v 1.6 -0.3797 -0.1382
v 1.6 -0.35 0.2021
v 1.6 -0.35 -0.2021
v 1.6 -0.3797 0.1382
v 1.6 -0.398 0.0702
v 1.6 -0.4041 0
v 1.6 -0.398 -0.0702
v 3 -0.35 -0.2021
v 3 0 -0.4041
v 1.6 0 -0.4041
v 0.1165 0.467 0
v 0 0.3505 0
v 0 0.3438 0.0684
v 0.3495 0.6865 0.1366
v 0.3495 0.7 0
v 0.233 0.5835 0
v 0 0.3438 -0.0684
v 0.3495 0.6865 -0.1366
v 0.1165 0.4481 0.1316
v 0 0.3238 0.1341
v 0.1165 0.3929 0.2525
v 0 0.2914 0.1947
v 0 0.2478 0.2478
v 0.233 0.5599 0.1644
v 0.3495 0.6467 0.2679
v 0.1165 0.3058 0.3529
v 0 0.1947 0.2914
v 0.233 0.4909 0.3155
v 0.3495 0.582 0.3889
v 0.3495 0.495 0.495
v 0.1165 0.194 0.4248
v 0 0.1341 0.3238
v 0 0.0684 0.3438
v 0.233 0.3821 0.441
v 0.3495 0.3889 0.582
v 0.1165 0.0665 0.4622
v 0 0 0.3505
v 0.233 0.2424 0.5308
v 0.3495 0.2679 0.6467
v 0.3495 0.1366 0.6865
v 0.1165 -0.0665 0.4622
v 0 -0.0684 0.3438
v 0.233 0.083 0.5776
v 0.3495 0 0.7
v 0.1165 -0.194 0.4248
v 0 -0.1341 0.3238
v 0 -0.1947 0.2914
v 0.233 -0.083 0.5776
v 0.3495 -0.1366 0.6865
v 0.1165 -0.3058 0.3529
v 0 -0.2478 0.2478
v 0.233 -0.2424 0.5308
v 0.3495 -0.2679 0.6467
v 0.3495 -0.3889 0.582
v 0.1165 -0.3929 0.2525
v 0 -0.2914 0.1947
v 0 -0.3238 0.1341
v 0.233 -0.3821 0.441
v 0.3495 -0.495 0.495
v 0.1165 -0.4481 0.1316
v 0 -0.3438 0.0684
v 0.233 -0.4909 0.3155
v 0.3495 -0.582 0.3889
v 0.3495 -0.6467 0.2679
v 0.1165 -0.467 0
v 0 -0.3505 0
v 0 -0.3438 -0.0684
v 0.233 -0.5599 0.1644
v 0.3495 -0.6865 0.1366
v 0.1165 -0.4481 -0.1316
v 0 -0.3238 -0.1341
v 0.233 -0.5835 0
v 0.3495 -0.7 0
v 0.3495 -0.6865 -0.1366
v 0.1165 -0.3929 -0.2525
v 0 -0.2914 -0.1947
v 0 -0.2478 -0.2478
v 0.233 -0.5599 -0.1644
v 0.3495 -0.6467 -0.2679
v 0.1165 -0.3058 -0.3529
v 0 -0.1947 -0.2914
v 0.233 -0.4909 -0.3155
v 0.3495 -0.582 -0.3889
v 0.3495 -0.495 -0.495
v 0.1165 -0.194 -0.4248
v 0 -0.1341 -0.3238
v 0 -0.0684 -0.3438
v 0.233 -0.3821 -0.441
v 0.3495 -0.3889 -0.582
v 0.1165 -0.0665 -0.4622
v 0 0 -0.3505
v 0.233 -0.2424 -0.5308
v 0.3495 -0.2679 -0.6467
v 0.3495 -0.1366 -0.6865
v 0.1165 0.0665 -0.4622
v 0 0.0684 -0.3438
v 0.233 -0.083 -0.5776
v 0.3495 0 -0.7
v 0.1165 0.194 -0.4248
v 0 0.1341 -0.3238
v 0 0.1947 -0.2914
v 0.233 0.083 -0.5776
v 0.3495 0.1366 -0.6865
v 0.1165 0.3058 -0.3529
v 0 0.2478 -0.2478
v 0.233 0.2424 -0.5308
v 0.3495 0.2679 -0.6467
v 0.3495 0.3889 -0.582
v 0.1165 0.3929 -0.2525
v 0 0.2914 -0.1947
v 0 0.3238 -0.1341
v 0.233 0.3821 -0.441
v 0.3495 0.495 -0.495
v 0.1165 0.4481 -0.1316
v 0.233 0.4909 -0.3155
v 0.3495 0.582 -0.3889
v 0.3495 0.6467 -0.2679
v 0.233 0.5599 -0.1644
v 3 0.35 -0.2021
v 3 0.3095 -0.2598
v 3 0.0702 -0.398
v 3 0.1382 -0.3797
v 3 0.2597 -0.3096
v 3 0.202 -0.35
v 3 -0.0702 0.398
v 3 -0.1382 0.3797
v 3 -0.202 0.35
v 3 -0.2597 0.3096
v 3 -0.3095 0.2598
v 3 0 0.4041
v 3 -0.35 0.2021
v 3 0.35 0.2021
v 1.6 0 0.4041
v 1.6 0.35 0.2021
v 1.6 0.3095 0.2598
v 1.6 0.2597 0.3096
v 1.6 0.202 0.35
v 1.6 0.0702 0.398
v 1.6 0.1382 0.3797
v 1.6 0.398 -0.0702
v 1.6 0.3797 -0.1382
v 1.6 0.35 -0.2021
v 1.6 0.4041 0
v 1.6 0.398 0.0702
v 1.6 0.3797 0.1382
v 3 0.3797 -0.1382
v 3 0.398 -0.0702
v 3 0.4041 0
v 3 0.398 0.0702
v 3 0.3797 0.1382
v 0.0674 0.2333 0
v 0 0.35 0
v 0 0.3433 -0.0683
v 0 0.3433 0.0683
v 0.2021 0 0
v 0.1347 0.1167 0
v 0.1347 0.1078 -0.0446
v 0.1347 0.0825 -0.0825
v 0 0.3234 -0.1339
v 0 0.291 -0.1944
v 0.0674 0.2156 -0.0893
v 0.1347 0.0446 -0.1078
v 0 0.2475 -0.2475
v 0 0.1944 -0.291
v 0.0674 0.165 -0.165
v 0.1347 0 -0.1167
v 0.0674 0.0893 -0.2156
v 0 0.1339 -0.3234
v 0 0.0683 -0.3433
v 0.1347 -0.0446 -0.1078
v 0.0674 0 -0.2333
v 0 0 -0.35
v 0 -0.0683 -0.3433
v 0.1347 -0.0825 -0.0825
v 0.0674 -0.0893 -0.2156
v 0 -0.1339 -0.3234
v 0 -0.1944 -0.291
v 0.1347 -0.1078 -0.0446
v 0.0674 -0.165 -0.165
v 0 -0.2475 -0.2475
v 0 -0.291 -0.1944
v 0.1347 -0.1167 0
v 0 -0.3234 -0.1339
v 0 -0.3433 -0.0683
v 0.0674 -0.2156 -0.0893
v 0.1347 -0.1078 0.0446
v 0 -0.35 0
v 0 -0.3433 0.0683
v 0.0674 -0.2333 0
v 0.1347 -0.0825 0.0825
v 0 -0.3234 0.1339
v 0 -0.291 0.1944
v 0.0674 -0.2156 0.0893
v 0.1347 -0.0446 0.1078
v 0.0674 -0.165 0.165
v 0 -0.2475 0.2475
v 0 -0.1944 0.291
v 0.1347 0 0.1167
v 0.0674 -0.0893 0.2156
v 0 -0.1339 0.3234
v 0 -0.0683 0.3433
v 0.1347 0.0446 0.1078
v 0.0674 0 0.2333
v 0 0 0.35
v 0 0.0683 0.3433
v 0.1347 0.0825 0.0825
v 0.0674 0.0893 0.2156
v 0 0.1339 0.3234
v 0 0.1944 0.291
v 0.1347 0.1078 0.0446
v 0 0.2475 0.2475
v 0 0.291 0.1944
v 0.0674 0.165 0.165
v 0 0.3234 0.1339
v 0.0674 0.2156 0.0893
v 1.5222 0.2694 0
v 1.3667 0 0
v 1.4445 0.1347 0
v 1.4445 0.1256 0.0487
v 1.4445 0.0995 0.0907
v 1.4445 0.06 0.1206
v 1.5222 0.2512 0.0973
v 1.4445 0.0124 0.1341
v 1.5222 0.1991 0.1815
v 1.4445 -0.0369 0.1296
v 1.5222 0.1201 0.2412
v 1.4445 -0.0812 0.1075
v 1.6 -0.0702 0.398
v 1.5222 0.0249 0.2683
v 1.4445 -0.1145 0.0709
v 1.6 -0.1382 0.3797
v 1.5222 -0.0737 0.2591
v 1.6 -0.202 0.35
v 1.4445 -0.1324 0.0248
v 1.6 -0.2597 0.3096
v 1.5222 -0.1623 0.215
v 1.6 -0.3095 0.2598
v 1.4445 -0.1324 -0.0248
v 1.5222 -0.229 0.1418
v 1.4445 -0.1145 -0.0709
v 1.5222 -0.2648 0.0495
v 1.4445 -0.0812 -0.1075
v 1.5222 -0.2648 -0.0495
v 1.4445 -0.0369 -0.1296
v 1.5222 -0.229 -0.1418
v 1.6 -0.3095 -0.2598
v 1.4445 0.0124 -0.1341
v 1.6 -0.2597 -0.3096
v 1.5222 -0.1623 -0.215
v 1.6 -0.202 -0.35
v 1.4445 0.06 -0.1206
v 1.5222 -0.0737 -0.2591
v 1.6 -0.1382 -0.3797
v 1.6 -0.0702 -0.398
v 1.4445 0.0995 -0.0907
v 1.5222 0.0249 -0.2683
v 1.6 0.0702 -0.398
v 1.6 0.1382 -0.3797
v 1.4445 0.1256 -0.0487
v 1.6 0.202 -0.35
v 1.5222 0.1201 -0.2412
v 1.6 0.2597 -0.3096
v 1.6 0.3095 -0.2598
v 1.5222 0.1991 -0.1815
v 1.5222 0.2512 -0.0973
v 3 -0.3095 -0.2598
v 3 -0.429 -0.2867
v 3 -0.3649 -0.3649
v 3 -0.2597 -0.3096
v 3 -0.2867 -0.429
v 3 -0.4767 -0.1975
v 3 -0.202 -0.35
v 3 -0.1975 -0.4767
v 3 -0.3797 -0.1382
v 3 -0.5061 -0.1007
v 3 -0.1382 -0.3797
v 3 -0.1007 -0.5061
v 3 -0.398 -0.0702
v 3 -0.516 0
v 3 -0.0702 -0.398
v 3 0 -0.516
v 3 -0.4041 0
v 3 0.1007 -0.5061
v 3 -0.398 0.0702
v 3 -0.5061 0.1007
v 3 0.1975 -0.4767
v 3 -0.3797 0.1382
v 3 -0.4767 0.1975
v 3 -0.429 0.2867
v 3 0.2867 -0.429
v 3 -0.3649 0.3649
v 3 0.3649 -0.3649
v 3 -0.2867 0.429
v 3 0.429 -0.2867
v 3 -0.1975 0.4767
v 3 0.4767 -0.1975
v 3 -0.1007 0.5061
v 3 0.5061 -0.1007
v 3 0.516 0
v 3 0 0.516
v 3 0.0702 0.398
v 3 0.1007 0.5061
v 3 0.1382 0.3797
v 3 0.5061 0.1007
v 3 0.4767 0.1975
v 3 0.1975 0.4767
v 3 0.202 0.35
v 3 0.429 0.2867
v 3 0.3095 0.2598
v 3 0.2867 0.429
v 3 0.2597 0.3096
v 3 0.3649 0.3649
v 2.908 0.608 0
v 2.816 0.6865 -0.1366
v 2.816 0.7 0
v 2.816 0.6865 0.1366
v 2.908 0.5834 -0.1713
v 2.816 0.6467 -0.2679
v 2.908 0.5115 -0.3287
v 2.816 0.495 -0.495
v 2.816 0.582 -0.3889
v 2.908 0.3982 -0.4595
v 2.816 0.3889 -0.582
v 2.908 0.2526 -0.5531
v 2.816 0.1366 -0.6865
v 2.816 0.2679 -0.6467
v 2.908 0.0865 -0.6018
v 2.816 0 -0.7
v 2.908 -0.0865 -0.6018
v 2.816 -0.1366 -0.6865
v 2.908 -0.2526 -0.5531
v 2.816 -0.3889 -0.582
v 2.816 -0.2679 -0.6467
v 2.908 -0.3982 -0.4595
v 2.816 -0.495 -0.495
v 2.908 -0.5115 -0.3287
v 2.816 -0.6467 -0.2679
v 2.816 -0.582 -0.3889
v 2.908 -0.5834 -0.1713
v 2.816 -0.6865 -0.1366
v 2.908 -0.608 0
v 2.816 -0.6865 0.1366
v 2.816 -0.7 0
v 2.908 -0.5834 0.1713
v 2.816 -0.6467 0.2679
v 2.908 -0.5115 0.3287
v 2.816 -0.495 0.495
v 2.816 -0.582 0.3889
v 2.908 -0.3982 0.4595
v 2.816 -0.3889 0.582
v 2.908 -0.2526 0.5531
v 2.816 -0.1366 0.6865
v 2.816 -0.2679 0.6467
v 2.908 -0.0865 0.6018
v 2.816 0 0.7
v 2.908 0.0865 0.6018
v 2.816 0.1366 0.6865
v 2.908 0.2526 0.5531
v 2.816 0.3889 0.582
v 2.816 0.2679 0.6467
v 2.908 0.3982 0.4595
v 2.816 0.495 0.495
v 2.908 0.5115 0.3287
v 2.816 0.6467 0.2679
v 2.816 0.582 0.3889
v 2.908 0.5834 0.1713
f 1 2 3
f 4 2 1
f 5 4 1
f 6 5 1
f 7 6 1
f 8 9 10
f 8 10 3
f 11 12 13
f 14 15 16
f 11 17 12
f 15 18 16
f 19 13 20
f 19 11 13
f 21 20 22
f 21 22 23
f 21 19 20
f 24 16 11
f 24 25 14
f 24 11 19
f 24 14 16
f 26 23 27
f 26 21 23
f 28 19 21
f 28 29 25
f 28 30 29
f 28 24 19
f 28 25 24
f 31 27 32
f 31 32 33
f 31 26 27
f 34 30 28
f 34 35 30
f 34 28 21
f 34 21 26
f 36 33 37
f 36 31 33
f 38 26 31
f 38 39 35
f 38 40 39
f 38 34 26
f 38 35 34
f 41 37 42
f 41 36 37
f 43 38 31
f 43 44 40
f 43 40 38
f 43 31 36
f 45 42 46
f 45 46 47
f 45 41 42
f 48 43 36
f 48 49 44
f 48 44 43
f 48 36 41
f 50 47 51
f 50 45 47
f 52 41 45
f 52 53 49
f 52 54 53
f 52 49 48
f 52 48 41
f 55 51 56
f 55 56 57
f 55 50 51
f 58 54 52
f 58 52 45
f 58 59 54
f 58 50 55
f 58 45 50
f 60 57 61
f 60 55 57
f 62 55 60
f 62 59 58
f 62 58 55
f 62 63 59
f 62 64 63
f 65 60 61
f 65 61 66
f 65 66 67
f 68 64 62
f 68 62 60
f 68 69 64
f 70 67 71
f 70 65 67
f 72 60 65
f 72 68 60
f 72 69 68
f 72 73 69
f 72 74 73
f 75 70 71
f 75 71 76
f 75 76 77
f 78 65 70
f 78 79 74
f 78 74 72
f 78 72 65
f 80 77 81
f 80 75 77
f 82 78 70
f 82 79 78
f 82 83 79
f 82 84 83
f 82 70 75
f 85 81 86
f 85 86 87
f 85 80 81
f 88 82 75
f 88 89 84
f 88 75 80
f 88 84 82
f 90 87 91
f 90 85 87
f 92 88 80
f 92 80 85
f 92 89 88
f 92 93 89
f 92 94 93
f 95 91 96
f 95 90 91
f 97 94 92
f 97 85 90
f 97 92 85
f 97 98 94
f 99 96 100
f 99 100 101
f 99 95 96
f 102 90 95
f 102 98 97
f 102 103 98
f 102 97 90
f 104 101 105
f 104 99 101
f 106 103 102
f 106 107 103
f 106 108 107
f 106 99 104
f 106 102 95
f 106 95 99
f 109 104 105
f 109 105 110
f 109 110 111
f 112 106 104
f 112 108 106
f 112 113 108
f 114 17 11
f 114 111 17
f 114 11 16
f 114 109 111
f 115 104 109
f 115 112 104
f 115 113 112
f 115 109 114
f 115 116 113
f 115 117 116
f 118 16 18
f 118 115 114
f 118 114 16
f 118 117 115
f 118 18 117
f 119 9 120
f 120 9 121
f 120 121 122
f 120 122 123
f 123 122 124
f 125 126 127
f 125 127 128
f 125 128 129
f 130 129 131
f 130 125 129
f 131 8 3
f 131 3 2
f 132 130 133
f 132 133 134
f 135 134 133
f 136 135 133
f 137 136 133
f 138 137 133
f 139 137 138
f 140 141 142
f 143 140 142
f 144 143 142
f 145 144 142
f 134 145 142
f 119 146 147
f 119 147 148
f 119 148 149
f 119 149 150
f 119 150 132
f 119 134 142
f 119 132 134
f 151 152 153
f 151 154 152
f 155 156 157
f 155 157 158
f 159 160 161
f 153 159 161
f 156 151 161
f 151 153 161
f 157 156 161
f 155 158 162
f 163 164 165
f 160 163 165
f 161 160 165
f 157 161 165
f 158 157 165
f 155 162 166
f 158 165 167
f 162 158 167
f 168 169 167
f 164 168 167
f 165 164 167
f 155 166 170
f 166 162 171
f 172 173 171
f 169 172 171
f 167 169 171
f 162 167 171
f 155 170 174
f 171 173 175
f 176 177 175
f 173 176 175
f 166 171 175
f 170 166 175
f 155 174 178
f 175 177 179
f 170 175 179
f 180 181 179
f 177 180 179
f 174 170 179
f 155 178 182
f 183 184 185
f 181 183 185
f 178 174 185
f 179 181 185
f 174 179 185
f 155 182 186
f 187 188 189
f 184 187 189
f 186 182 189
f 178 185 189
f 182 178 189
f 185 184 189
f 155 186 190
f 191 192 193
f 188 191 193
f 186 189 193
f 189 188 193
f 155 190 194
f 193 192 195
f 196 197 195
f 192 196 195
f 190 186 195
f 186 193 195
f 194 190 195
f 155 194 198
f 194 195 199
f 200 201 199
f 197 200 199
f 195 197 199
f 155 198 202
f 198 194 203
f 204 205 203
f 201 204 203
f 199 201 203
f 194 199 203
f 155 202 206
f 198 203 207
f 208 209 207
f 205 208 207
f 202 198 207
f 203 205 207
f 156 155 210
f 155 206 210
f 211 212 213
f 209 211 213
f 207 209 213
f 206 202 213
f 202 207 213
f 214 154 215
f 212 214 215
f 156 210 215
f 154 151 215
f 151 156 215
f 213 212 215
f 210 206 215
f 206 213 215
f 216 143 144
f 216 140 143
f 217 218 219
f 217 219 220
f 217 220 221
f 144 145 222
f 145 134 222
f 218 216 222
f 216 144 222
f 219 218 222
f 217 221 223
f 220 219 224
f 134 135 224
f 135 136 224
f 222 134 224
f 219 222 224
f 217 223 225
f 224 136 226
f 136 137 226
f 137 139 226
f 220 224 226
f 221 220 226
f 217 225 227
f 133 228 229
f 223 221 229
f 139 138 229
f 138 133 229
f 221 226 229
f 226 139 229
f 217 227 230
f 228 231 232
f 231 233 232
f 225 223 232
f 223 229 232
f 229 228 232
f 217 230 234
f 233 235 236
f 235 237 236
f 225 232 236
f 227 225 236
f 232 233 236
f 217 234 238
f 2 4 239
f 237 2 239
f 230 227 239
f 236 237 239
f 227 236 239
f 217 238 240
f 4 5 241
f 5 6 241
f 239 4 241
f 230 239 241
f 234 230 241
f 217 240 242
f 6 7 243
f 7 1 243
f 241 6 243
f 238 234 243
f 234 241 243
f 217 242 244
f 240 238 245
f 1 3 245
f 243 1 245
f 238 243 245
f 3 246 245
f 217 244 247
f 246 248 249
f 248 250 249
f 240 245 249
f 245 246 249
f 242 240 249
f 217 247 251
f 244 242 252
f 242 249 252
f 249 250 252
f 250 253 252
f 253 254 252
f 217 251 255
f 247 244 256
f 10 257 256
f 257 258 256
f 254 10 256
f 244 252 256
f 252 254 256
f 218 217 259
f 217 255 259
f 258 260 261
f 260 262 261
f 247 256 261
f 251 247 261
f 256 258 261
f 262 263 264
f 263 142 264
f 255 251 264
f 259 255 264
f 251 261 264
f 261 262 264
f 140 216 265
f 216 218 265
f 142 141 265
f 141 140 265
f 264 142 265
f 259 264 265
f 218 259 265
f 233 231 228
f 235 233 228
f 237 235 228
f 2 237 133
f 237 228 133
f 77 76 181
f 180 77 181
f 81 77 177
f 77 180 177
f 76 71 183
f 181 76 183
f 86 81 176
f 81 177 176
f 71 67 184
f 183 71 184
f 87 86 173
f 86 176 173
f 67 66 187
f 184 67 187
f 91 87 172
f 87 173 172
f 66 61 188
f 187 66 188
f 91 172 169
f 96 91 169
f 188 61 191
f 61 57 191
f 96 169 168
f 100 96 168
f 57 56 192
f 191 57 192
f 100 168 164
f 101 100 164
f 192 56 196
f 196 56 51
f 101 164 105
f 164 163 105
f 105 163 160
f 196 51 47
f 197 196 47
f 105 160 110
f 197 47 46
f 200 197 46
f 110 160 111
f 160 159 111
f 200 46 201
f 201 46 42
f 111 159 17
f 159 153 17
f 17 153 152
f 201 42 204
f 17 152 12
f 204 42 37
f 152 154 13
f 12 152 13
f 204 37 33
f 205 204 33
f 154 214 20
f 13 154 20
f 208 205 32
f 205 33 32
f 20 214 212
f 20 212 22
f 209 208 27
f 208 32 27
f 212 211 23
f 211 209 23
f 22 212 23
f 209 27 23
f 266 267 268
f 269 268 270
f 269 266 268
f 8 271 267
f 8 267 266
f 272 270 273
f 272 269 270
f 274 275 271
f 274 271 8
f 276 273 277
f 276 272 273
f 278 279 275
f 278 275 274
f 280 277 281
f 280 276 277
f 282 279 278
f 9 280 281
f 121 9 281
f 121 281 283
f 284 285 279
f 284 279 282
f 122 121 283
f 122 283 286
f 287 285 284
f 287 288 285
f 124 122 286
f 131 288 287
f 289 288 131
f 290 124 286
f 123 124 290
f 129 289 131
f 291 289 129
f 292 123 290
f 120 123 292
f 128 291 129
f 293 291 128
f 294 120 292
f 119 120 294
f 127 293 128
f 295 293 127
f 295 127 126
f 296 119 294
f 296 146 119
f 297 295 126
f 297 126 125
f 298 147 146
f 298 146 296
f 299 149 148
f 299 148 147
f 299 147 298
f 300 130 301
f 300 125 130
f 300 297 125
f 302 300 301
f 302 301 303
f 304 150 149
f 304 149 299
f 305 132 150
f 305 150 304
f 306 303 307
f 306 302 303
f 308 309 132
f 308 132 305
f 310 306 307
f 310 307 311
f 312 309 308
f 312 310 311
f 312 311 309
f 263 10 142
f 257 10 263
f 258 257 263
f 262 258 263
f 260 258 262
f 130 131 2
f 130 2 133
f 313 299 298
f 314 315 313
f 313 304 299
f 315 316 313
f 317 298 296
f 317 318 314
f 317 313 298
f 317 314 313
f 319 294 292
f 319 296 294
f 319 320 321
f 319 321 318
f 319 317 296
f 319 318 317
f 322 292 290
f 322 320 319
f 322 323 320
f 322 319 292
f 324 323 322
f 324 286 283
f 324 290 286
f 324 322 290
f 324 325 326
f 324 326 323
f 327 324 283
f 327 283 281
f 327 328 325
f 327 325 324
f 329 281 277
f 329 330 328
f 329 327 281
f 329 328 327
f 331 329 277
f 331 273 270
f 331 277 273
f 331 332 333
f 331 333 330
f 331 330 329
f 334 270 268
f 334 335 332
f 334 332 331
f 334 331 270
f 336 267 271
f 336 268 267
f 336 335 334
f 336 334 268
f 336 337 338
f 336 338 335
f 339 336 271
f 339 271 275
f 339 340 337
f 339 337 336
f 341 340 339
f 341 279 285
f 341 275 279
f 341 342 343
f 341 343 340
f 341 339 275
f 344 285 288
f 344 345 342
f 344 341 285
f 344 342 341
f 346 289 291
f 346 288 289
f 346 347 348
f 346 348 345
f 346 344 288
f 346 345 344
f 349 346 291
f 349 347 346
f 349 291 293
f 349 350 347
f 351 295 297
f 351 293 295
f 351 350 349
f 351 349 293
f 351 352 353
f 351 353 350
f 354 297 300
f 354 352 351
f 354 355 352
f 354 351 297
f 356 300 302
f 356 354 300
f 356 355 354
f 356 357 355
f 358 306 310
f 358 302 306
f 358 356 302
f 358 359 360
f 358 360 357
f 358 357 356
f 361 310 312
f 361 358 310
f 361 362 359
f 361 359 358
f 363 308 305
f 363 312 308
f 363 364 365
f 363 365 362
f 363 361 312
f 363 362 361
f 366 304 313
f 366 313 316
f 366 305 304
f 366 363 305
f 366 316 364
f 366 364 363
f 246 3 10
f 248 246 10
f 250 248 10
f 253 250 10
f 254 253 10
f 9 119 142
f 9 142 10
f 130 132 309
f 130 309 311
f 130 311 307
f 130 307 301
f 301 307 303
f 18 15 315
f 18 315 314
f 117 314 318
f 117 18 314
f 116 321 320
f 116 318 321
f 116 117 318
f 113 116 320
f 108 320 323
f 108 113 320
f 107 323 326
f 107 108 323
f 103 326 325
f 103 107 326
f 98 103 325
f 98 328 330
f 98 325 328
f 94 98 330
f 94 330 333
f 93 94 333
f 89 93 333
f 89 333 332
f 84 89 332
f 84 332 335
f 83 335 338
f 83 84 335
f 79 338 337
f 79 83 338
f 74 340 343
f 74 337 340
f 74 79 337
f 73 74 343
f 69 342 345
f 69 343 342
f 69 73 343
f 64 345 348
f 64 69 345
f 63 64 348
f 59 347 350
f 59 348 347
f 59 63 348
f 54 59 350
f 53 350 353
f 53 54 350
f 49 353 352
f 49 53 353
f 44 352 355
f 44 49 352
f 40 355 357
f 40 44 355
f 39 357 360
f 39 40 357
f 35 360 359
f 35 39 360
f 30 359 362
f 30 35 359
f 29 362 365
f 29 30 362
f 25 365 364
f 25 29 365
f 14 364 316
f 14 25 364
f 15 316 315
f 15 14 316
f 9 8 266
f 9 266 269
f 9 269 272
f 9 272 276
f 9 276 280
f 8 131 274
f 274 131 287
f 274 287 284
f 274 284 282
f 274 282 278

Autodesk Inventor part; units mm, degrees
ref_plane "YZ Plane" through (0, 0, 0) normal (1, 0, 0) x (0, 1, 0)
ref_plane "XZ Plane" through (0, 0, 0) normal (0, 1, 0) x (-1, 0, 0)
sketch "Sketch1" plane through (0, 0, 0) normal (0, 0, 1) x (1, 0, 0)
  line L0 (0.2021, 0) -> (1.3667, 0)
  line L1 (3, 0.4041) -> (3, 0.7)
  line L2 (3, 0.7) -> (0, 0.7)
  line L3 (3, 0.4041) -> (1.6, 0.4041)
  line L4 (1.6, 0.4041) -> (1.3667, 0)
  line L5 (0, 0.35) -> (0.2021, 0)
  line L6 (0, -0.14) -> (0, 0.84) projected
  line L7 (0, 0.35) -> (0, 0.7)
  point P0 (0, 0)
  dimension "d0" = 1.4
  dimension "d1" = 60
  dimension "d2" = 1.4
  dimension "d3" = 0.8083
  dimension "d4" = 3
  dimension "d5" = 60
  dimension "d7" = 0.7
revolve "Body" add sketch "Sketch1" angle 360 about axis through (0.2021, 0, 0) along (1, 0, 0)
sketch "Sketch2" plane through (3, 0, 0) normal (1, 0, 0) x (0, 0, -1)
  circle A0 centre (0, 0) radius 0.4041 projected
  circle A1 centre (0, 0) radius 0.7 projected
  line L0 (0.4041, 0) -> (0.2021, -0.35)
  line L1 (0.2021, -0.35) -> (-0.2021, -0.35)
  line L2 (-0.2021, -0.35) -> (-0.4041, 0)
  line L3 (-0.4041, 0) -> (-0.2021, 0.35)
  line L4 (-0.2021, 0.35) -> (0.2021, 0.35)
  line L5 (0.2021, 0.35) -> (0.4041, 0)
extrude "Slot" add sketch "Sketch2" against normal blind 1.4 contours L5 A0 | A0 L0 | L4 A0 | A0 L1 | L3 A0 | A0 L2
chamfer "Chamfer1" distance 0.35 angle 45 1 edges at (0, -0.7, 0) measured on face at (0, 0.5766, -0.0558)
thread "Thread" size "M1.4x0.3" class "6g" standard "ISO Metric profile" length 3
chamfer "Chamfer2" distance 0.184 angle 45 1 edges at (3, -0.7, 0) measured on face at (2.1165, 0.6909, -0.1123)
ref_plane "Work Plane1" through (1.5, 0, 0) normal (0, -0.5, -0.866) x (1, 0, 0)
equation "\"d0\" = INTI"
equation "\"d2\" = NND"
equation "\"d3\" = 1.1547 * SW"
equation "\"d4\" = NLG"
equation "\"d5\" = 0.5 * ANG"
equation "\"d7\" = SPD"
equation "\"d8\" = INTI"
equation "\"d10\" = -0.5 * SPD + 0.5 * NND"
equation "\"d11\" = FAWI"
equation "\"d33\" = -0.5 * SPD + 0.5 * NND"
equation "\"d14\" = NLG"
equation "\"d12\" = -0.5 * GD1 + 0.5 * NND"
equation "\"d13\" = FAWI"
equation "\"d34\" = -0.5 * GD1 + 0.5 * NND"
equation "\"NND\" = 1.4"
equation "\"NLG\" = 3"
equation "\"INTI\" = 1.4"
equation "\"FAWI\" = 45deg"
equation "\"SW\" = 0.7"
equation "\"GD1\" = THREADDIA - 1.2269 * PTC"
equation "\"ANG\" = 120deg"
equation "\"FAWI1\" = 45deg"
equation "\"SPD\" = 0.7"
equation "\"GUL\" = 0.61345 * PTC"
equation "\"TOA\" = 30deg"
equation "\"ZLG\" = 0.5"
equation "\"THREADDIA\" = 1.4"
equation "\"PTC\" = 0.3"
equation "\"GAL\" = 0.61345 * PTC"
equation "\"E0\" = 1.155 * SW"
properties part number "CNS 4480 - M1.4 x 3" material "Steel, Mild"
